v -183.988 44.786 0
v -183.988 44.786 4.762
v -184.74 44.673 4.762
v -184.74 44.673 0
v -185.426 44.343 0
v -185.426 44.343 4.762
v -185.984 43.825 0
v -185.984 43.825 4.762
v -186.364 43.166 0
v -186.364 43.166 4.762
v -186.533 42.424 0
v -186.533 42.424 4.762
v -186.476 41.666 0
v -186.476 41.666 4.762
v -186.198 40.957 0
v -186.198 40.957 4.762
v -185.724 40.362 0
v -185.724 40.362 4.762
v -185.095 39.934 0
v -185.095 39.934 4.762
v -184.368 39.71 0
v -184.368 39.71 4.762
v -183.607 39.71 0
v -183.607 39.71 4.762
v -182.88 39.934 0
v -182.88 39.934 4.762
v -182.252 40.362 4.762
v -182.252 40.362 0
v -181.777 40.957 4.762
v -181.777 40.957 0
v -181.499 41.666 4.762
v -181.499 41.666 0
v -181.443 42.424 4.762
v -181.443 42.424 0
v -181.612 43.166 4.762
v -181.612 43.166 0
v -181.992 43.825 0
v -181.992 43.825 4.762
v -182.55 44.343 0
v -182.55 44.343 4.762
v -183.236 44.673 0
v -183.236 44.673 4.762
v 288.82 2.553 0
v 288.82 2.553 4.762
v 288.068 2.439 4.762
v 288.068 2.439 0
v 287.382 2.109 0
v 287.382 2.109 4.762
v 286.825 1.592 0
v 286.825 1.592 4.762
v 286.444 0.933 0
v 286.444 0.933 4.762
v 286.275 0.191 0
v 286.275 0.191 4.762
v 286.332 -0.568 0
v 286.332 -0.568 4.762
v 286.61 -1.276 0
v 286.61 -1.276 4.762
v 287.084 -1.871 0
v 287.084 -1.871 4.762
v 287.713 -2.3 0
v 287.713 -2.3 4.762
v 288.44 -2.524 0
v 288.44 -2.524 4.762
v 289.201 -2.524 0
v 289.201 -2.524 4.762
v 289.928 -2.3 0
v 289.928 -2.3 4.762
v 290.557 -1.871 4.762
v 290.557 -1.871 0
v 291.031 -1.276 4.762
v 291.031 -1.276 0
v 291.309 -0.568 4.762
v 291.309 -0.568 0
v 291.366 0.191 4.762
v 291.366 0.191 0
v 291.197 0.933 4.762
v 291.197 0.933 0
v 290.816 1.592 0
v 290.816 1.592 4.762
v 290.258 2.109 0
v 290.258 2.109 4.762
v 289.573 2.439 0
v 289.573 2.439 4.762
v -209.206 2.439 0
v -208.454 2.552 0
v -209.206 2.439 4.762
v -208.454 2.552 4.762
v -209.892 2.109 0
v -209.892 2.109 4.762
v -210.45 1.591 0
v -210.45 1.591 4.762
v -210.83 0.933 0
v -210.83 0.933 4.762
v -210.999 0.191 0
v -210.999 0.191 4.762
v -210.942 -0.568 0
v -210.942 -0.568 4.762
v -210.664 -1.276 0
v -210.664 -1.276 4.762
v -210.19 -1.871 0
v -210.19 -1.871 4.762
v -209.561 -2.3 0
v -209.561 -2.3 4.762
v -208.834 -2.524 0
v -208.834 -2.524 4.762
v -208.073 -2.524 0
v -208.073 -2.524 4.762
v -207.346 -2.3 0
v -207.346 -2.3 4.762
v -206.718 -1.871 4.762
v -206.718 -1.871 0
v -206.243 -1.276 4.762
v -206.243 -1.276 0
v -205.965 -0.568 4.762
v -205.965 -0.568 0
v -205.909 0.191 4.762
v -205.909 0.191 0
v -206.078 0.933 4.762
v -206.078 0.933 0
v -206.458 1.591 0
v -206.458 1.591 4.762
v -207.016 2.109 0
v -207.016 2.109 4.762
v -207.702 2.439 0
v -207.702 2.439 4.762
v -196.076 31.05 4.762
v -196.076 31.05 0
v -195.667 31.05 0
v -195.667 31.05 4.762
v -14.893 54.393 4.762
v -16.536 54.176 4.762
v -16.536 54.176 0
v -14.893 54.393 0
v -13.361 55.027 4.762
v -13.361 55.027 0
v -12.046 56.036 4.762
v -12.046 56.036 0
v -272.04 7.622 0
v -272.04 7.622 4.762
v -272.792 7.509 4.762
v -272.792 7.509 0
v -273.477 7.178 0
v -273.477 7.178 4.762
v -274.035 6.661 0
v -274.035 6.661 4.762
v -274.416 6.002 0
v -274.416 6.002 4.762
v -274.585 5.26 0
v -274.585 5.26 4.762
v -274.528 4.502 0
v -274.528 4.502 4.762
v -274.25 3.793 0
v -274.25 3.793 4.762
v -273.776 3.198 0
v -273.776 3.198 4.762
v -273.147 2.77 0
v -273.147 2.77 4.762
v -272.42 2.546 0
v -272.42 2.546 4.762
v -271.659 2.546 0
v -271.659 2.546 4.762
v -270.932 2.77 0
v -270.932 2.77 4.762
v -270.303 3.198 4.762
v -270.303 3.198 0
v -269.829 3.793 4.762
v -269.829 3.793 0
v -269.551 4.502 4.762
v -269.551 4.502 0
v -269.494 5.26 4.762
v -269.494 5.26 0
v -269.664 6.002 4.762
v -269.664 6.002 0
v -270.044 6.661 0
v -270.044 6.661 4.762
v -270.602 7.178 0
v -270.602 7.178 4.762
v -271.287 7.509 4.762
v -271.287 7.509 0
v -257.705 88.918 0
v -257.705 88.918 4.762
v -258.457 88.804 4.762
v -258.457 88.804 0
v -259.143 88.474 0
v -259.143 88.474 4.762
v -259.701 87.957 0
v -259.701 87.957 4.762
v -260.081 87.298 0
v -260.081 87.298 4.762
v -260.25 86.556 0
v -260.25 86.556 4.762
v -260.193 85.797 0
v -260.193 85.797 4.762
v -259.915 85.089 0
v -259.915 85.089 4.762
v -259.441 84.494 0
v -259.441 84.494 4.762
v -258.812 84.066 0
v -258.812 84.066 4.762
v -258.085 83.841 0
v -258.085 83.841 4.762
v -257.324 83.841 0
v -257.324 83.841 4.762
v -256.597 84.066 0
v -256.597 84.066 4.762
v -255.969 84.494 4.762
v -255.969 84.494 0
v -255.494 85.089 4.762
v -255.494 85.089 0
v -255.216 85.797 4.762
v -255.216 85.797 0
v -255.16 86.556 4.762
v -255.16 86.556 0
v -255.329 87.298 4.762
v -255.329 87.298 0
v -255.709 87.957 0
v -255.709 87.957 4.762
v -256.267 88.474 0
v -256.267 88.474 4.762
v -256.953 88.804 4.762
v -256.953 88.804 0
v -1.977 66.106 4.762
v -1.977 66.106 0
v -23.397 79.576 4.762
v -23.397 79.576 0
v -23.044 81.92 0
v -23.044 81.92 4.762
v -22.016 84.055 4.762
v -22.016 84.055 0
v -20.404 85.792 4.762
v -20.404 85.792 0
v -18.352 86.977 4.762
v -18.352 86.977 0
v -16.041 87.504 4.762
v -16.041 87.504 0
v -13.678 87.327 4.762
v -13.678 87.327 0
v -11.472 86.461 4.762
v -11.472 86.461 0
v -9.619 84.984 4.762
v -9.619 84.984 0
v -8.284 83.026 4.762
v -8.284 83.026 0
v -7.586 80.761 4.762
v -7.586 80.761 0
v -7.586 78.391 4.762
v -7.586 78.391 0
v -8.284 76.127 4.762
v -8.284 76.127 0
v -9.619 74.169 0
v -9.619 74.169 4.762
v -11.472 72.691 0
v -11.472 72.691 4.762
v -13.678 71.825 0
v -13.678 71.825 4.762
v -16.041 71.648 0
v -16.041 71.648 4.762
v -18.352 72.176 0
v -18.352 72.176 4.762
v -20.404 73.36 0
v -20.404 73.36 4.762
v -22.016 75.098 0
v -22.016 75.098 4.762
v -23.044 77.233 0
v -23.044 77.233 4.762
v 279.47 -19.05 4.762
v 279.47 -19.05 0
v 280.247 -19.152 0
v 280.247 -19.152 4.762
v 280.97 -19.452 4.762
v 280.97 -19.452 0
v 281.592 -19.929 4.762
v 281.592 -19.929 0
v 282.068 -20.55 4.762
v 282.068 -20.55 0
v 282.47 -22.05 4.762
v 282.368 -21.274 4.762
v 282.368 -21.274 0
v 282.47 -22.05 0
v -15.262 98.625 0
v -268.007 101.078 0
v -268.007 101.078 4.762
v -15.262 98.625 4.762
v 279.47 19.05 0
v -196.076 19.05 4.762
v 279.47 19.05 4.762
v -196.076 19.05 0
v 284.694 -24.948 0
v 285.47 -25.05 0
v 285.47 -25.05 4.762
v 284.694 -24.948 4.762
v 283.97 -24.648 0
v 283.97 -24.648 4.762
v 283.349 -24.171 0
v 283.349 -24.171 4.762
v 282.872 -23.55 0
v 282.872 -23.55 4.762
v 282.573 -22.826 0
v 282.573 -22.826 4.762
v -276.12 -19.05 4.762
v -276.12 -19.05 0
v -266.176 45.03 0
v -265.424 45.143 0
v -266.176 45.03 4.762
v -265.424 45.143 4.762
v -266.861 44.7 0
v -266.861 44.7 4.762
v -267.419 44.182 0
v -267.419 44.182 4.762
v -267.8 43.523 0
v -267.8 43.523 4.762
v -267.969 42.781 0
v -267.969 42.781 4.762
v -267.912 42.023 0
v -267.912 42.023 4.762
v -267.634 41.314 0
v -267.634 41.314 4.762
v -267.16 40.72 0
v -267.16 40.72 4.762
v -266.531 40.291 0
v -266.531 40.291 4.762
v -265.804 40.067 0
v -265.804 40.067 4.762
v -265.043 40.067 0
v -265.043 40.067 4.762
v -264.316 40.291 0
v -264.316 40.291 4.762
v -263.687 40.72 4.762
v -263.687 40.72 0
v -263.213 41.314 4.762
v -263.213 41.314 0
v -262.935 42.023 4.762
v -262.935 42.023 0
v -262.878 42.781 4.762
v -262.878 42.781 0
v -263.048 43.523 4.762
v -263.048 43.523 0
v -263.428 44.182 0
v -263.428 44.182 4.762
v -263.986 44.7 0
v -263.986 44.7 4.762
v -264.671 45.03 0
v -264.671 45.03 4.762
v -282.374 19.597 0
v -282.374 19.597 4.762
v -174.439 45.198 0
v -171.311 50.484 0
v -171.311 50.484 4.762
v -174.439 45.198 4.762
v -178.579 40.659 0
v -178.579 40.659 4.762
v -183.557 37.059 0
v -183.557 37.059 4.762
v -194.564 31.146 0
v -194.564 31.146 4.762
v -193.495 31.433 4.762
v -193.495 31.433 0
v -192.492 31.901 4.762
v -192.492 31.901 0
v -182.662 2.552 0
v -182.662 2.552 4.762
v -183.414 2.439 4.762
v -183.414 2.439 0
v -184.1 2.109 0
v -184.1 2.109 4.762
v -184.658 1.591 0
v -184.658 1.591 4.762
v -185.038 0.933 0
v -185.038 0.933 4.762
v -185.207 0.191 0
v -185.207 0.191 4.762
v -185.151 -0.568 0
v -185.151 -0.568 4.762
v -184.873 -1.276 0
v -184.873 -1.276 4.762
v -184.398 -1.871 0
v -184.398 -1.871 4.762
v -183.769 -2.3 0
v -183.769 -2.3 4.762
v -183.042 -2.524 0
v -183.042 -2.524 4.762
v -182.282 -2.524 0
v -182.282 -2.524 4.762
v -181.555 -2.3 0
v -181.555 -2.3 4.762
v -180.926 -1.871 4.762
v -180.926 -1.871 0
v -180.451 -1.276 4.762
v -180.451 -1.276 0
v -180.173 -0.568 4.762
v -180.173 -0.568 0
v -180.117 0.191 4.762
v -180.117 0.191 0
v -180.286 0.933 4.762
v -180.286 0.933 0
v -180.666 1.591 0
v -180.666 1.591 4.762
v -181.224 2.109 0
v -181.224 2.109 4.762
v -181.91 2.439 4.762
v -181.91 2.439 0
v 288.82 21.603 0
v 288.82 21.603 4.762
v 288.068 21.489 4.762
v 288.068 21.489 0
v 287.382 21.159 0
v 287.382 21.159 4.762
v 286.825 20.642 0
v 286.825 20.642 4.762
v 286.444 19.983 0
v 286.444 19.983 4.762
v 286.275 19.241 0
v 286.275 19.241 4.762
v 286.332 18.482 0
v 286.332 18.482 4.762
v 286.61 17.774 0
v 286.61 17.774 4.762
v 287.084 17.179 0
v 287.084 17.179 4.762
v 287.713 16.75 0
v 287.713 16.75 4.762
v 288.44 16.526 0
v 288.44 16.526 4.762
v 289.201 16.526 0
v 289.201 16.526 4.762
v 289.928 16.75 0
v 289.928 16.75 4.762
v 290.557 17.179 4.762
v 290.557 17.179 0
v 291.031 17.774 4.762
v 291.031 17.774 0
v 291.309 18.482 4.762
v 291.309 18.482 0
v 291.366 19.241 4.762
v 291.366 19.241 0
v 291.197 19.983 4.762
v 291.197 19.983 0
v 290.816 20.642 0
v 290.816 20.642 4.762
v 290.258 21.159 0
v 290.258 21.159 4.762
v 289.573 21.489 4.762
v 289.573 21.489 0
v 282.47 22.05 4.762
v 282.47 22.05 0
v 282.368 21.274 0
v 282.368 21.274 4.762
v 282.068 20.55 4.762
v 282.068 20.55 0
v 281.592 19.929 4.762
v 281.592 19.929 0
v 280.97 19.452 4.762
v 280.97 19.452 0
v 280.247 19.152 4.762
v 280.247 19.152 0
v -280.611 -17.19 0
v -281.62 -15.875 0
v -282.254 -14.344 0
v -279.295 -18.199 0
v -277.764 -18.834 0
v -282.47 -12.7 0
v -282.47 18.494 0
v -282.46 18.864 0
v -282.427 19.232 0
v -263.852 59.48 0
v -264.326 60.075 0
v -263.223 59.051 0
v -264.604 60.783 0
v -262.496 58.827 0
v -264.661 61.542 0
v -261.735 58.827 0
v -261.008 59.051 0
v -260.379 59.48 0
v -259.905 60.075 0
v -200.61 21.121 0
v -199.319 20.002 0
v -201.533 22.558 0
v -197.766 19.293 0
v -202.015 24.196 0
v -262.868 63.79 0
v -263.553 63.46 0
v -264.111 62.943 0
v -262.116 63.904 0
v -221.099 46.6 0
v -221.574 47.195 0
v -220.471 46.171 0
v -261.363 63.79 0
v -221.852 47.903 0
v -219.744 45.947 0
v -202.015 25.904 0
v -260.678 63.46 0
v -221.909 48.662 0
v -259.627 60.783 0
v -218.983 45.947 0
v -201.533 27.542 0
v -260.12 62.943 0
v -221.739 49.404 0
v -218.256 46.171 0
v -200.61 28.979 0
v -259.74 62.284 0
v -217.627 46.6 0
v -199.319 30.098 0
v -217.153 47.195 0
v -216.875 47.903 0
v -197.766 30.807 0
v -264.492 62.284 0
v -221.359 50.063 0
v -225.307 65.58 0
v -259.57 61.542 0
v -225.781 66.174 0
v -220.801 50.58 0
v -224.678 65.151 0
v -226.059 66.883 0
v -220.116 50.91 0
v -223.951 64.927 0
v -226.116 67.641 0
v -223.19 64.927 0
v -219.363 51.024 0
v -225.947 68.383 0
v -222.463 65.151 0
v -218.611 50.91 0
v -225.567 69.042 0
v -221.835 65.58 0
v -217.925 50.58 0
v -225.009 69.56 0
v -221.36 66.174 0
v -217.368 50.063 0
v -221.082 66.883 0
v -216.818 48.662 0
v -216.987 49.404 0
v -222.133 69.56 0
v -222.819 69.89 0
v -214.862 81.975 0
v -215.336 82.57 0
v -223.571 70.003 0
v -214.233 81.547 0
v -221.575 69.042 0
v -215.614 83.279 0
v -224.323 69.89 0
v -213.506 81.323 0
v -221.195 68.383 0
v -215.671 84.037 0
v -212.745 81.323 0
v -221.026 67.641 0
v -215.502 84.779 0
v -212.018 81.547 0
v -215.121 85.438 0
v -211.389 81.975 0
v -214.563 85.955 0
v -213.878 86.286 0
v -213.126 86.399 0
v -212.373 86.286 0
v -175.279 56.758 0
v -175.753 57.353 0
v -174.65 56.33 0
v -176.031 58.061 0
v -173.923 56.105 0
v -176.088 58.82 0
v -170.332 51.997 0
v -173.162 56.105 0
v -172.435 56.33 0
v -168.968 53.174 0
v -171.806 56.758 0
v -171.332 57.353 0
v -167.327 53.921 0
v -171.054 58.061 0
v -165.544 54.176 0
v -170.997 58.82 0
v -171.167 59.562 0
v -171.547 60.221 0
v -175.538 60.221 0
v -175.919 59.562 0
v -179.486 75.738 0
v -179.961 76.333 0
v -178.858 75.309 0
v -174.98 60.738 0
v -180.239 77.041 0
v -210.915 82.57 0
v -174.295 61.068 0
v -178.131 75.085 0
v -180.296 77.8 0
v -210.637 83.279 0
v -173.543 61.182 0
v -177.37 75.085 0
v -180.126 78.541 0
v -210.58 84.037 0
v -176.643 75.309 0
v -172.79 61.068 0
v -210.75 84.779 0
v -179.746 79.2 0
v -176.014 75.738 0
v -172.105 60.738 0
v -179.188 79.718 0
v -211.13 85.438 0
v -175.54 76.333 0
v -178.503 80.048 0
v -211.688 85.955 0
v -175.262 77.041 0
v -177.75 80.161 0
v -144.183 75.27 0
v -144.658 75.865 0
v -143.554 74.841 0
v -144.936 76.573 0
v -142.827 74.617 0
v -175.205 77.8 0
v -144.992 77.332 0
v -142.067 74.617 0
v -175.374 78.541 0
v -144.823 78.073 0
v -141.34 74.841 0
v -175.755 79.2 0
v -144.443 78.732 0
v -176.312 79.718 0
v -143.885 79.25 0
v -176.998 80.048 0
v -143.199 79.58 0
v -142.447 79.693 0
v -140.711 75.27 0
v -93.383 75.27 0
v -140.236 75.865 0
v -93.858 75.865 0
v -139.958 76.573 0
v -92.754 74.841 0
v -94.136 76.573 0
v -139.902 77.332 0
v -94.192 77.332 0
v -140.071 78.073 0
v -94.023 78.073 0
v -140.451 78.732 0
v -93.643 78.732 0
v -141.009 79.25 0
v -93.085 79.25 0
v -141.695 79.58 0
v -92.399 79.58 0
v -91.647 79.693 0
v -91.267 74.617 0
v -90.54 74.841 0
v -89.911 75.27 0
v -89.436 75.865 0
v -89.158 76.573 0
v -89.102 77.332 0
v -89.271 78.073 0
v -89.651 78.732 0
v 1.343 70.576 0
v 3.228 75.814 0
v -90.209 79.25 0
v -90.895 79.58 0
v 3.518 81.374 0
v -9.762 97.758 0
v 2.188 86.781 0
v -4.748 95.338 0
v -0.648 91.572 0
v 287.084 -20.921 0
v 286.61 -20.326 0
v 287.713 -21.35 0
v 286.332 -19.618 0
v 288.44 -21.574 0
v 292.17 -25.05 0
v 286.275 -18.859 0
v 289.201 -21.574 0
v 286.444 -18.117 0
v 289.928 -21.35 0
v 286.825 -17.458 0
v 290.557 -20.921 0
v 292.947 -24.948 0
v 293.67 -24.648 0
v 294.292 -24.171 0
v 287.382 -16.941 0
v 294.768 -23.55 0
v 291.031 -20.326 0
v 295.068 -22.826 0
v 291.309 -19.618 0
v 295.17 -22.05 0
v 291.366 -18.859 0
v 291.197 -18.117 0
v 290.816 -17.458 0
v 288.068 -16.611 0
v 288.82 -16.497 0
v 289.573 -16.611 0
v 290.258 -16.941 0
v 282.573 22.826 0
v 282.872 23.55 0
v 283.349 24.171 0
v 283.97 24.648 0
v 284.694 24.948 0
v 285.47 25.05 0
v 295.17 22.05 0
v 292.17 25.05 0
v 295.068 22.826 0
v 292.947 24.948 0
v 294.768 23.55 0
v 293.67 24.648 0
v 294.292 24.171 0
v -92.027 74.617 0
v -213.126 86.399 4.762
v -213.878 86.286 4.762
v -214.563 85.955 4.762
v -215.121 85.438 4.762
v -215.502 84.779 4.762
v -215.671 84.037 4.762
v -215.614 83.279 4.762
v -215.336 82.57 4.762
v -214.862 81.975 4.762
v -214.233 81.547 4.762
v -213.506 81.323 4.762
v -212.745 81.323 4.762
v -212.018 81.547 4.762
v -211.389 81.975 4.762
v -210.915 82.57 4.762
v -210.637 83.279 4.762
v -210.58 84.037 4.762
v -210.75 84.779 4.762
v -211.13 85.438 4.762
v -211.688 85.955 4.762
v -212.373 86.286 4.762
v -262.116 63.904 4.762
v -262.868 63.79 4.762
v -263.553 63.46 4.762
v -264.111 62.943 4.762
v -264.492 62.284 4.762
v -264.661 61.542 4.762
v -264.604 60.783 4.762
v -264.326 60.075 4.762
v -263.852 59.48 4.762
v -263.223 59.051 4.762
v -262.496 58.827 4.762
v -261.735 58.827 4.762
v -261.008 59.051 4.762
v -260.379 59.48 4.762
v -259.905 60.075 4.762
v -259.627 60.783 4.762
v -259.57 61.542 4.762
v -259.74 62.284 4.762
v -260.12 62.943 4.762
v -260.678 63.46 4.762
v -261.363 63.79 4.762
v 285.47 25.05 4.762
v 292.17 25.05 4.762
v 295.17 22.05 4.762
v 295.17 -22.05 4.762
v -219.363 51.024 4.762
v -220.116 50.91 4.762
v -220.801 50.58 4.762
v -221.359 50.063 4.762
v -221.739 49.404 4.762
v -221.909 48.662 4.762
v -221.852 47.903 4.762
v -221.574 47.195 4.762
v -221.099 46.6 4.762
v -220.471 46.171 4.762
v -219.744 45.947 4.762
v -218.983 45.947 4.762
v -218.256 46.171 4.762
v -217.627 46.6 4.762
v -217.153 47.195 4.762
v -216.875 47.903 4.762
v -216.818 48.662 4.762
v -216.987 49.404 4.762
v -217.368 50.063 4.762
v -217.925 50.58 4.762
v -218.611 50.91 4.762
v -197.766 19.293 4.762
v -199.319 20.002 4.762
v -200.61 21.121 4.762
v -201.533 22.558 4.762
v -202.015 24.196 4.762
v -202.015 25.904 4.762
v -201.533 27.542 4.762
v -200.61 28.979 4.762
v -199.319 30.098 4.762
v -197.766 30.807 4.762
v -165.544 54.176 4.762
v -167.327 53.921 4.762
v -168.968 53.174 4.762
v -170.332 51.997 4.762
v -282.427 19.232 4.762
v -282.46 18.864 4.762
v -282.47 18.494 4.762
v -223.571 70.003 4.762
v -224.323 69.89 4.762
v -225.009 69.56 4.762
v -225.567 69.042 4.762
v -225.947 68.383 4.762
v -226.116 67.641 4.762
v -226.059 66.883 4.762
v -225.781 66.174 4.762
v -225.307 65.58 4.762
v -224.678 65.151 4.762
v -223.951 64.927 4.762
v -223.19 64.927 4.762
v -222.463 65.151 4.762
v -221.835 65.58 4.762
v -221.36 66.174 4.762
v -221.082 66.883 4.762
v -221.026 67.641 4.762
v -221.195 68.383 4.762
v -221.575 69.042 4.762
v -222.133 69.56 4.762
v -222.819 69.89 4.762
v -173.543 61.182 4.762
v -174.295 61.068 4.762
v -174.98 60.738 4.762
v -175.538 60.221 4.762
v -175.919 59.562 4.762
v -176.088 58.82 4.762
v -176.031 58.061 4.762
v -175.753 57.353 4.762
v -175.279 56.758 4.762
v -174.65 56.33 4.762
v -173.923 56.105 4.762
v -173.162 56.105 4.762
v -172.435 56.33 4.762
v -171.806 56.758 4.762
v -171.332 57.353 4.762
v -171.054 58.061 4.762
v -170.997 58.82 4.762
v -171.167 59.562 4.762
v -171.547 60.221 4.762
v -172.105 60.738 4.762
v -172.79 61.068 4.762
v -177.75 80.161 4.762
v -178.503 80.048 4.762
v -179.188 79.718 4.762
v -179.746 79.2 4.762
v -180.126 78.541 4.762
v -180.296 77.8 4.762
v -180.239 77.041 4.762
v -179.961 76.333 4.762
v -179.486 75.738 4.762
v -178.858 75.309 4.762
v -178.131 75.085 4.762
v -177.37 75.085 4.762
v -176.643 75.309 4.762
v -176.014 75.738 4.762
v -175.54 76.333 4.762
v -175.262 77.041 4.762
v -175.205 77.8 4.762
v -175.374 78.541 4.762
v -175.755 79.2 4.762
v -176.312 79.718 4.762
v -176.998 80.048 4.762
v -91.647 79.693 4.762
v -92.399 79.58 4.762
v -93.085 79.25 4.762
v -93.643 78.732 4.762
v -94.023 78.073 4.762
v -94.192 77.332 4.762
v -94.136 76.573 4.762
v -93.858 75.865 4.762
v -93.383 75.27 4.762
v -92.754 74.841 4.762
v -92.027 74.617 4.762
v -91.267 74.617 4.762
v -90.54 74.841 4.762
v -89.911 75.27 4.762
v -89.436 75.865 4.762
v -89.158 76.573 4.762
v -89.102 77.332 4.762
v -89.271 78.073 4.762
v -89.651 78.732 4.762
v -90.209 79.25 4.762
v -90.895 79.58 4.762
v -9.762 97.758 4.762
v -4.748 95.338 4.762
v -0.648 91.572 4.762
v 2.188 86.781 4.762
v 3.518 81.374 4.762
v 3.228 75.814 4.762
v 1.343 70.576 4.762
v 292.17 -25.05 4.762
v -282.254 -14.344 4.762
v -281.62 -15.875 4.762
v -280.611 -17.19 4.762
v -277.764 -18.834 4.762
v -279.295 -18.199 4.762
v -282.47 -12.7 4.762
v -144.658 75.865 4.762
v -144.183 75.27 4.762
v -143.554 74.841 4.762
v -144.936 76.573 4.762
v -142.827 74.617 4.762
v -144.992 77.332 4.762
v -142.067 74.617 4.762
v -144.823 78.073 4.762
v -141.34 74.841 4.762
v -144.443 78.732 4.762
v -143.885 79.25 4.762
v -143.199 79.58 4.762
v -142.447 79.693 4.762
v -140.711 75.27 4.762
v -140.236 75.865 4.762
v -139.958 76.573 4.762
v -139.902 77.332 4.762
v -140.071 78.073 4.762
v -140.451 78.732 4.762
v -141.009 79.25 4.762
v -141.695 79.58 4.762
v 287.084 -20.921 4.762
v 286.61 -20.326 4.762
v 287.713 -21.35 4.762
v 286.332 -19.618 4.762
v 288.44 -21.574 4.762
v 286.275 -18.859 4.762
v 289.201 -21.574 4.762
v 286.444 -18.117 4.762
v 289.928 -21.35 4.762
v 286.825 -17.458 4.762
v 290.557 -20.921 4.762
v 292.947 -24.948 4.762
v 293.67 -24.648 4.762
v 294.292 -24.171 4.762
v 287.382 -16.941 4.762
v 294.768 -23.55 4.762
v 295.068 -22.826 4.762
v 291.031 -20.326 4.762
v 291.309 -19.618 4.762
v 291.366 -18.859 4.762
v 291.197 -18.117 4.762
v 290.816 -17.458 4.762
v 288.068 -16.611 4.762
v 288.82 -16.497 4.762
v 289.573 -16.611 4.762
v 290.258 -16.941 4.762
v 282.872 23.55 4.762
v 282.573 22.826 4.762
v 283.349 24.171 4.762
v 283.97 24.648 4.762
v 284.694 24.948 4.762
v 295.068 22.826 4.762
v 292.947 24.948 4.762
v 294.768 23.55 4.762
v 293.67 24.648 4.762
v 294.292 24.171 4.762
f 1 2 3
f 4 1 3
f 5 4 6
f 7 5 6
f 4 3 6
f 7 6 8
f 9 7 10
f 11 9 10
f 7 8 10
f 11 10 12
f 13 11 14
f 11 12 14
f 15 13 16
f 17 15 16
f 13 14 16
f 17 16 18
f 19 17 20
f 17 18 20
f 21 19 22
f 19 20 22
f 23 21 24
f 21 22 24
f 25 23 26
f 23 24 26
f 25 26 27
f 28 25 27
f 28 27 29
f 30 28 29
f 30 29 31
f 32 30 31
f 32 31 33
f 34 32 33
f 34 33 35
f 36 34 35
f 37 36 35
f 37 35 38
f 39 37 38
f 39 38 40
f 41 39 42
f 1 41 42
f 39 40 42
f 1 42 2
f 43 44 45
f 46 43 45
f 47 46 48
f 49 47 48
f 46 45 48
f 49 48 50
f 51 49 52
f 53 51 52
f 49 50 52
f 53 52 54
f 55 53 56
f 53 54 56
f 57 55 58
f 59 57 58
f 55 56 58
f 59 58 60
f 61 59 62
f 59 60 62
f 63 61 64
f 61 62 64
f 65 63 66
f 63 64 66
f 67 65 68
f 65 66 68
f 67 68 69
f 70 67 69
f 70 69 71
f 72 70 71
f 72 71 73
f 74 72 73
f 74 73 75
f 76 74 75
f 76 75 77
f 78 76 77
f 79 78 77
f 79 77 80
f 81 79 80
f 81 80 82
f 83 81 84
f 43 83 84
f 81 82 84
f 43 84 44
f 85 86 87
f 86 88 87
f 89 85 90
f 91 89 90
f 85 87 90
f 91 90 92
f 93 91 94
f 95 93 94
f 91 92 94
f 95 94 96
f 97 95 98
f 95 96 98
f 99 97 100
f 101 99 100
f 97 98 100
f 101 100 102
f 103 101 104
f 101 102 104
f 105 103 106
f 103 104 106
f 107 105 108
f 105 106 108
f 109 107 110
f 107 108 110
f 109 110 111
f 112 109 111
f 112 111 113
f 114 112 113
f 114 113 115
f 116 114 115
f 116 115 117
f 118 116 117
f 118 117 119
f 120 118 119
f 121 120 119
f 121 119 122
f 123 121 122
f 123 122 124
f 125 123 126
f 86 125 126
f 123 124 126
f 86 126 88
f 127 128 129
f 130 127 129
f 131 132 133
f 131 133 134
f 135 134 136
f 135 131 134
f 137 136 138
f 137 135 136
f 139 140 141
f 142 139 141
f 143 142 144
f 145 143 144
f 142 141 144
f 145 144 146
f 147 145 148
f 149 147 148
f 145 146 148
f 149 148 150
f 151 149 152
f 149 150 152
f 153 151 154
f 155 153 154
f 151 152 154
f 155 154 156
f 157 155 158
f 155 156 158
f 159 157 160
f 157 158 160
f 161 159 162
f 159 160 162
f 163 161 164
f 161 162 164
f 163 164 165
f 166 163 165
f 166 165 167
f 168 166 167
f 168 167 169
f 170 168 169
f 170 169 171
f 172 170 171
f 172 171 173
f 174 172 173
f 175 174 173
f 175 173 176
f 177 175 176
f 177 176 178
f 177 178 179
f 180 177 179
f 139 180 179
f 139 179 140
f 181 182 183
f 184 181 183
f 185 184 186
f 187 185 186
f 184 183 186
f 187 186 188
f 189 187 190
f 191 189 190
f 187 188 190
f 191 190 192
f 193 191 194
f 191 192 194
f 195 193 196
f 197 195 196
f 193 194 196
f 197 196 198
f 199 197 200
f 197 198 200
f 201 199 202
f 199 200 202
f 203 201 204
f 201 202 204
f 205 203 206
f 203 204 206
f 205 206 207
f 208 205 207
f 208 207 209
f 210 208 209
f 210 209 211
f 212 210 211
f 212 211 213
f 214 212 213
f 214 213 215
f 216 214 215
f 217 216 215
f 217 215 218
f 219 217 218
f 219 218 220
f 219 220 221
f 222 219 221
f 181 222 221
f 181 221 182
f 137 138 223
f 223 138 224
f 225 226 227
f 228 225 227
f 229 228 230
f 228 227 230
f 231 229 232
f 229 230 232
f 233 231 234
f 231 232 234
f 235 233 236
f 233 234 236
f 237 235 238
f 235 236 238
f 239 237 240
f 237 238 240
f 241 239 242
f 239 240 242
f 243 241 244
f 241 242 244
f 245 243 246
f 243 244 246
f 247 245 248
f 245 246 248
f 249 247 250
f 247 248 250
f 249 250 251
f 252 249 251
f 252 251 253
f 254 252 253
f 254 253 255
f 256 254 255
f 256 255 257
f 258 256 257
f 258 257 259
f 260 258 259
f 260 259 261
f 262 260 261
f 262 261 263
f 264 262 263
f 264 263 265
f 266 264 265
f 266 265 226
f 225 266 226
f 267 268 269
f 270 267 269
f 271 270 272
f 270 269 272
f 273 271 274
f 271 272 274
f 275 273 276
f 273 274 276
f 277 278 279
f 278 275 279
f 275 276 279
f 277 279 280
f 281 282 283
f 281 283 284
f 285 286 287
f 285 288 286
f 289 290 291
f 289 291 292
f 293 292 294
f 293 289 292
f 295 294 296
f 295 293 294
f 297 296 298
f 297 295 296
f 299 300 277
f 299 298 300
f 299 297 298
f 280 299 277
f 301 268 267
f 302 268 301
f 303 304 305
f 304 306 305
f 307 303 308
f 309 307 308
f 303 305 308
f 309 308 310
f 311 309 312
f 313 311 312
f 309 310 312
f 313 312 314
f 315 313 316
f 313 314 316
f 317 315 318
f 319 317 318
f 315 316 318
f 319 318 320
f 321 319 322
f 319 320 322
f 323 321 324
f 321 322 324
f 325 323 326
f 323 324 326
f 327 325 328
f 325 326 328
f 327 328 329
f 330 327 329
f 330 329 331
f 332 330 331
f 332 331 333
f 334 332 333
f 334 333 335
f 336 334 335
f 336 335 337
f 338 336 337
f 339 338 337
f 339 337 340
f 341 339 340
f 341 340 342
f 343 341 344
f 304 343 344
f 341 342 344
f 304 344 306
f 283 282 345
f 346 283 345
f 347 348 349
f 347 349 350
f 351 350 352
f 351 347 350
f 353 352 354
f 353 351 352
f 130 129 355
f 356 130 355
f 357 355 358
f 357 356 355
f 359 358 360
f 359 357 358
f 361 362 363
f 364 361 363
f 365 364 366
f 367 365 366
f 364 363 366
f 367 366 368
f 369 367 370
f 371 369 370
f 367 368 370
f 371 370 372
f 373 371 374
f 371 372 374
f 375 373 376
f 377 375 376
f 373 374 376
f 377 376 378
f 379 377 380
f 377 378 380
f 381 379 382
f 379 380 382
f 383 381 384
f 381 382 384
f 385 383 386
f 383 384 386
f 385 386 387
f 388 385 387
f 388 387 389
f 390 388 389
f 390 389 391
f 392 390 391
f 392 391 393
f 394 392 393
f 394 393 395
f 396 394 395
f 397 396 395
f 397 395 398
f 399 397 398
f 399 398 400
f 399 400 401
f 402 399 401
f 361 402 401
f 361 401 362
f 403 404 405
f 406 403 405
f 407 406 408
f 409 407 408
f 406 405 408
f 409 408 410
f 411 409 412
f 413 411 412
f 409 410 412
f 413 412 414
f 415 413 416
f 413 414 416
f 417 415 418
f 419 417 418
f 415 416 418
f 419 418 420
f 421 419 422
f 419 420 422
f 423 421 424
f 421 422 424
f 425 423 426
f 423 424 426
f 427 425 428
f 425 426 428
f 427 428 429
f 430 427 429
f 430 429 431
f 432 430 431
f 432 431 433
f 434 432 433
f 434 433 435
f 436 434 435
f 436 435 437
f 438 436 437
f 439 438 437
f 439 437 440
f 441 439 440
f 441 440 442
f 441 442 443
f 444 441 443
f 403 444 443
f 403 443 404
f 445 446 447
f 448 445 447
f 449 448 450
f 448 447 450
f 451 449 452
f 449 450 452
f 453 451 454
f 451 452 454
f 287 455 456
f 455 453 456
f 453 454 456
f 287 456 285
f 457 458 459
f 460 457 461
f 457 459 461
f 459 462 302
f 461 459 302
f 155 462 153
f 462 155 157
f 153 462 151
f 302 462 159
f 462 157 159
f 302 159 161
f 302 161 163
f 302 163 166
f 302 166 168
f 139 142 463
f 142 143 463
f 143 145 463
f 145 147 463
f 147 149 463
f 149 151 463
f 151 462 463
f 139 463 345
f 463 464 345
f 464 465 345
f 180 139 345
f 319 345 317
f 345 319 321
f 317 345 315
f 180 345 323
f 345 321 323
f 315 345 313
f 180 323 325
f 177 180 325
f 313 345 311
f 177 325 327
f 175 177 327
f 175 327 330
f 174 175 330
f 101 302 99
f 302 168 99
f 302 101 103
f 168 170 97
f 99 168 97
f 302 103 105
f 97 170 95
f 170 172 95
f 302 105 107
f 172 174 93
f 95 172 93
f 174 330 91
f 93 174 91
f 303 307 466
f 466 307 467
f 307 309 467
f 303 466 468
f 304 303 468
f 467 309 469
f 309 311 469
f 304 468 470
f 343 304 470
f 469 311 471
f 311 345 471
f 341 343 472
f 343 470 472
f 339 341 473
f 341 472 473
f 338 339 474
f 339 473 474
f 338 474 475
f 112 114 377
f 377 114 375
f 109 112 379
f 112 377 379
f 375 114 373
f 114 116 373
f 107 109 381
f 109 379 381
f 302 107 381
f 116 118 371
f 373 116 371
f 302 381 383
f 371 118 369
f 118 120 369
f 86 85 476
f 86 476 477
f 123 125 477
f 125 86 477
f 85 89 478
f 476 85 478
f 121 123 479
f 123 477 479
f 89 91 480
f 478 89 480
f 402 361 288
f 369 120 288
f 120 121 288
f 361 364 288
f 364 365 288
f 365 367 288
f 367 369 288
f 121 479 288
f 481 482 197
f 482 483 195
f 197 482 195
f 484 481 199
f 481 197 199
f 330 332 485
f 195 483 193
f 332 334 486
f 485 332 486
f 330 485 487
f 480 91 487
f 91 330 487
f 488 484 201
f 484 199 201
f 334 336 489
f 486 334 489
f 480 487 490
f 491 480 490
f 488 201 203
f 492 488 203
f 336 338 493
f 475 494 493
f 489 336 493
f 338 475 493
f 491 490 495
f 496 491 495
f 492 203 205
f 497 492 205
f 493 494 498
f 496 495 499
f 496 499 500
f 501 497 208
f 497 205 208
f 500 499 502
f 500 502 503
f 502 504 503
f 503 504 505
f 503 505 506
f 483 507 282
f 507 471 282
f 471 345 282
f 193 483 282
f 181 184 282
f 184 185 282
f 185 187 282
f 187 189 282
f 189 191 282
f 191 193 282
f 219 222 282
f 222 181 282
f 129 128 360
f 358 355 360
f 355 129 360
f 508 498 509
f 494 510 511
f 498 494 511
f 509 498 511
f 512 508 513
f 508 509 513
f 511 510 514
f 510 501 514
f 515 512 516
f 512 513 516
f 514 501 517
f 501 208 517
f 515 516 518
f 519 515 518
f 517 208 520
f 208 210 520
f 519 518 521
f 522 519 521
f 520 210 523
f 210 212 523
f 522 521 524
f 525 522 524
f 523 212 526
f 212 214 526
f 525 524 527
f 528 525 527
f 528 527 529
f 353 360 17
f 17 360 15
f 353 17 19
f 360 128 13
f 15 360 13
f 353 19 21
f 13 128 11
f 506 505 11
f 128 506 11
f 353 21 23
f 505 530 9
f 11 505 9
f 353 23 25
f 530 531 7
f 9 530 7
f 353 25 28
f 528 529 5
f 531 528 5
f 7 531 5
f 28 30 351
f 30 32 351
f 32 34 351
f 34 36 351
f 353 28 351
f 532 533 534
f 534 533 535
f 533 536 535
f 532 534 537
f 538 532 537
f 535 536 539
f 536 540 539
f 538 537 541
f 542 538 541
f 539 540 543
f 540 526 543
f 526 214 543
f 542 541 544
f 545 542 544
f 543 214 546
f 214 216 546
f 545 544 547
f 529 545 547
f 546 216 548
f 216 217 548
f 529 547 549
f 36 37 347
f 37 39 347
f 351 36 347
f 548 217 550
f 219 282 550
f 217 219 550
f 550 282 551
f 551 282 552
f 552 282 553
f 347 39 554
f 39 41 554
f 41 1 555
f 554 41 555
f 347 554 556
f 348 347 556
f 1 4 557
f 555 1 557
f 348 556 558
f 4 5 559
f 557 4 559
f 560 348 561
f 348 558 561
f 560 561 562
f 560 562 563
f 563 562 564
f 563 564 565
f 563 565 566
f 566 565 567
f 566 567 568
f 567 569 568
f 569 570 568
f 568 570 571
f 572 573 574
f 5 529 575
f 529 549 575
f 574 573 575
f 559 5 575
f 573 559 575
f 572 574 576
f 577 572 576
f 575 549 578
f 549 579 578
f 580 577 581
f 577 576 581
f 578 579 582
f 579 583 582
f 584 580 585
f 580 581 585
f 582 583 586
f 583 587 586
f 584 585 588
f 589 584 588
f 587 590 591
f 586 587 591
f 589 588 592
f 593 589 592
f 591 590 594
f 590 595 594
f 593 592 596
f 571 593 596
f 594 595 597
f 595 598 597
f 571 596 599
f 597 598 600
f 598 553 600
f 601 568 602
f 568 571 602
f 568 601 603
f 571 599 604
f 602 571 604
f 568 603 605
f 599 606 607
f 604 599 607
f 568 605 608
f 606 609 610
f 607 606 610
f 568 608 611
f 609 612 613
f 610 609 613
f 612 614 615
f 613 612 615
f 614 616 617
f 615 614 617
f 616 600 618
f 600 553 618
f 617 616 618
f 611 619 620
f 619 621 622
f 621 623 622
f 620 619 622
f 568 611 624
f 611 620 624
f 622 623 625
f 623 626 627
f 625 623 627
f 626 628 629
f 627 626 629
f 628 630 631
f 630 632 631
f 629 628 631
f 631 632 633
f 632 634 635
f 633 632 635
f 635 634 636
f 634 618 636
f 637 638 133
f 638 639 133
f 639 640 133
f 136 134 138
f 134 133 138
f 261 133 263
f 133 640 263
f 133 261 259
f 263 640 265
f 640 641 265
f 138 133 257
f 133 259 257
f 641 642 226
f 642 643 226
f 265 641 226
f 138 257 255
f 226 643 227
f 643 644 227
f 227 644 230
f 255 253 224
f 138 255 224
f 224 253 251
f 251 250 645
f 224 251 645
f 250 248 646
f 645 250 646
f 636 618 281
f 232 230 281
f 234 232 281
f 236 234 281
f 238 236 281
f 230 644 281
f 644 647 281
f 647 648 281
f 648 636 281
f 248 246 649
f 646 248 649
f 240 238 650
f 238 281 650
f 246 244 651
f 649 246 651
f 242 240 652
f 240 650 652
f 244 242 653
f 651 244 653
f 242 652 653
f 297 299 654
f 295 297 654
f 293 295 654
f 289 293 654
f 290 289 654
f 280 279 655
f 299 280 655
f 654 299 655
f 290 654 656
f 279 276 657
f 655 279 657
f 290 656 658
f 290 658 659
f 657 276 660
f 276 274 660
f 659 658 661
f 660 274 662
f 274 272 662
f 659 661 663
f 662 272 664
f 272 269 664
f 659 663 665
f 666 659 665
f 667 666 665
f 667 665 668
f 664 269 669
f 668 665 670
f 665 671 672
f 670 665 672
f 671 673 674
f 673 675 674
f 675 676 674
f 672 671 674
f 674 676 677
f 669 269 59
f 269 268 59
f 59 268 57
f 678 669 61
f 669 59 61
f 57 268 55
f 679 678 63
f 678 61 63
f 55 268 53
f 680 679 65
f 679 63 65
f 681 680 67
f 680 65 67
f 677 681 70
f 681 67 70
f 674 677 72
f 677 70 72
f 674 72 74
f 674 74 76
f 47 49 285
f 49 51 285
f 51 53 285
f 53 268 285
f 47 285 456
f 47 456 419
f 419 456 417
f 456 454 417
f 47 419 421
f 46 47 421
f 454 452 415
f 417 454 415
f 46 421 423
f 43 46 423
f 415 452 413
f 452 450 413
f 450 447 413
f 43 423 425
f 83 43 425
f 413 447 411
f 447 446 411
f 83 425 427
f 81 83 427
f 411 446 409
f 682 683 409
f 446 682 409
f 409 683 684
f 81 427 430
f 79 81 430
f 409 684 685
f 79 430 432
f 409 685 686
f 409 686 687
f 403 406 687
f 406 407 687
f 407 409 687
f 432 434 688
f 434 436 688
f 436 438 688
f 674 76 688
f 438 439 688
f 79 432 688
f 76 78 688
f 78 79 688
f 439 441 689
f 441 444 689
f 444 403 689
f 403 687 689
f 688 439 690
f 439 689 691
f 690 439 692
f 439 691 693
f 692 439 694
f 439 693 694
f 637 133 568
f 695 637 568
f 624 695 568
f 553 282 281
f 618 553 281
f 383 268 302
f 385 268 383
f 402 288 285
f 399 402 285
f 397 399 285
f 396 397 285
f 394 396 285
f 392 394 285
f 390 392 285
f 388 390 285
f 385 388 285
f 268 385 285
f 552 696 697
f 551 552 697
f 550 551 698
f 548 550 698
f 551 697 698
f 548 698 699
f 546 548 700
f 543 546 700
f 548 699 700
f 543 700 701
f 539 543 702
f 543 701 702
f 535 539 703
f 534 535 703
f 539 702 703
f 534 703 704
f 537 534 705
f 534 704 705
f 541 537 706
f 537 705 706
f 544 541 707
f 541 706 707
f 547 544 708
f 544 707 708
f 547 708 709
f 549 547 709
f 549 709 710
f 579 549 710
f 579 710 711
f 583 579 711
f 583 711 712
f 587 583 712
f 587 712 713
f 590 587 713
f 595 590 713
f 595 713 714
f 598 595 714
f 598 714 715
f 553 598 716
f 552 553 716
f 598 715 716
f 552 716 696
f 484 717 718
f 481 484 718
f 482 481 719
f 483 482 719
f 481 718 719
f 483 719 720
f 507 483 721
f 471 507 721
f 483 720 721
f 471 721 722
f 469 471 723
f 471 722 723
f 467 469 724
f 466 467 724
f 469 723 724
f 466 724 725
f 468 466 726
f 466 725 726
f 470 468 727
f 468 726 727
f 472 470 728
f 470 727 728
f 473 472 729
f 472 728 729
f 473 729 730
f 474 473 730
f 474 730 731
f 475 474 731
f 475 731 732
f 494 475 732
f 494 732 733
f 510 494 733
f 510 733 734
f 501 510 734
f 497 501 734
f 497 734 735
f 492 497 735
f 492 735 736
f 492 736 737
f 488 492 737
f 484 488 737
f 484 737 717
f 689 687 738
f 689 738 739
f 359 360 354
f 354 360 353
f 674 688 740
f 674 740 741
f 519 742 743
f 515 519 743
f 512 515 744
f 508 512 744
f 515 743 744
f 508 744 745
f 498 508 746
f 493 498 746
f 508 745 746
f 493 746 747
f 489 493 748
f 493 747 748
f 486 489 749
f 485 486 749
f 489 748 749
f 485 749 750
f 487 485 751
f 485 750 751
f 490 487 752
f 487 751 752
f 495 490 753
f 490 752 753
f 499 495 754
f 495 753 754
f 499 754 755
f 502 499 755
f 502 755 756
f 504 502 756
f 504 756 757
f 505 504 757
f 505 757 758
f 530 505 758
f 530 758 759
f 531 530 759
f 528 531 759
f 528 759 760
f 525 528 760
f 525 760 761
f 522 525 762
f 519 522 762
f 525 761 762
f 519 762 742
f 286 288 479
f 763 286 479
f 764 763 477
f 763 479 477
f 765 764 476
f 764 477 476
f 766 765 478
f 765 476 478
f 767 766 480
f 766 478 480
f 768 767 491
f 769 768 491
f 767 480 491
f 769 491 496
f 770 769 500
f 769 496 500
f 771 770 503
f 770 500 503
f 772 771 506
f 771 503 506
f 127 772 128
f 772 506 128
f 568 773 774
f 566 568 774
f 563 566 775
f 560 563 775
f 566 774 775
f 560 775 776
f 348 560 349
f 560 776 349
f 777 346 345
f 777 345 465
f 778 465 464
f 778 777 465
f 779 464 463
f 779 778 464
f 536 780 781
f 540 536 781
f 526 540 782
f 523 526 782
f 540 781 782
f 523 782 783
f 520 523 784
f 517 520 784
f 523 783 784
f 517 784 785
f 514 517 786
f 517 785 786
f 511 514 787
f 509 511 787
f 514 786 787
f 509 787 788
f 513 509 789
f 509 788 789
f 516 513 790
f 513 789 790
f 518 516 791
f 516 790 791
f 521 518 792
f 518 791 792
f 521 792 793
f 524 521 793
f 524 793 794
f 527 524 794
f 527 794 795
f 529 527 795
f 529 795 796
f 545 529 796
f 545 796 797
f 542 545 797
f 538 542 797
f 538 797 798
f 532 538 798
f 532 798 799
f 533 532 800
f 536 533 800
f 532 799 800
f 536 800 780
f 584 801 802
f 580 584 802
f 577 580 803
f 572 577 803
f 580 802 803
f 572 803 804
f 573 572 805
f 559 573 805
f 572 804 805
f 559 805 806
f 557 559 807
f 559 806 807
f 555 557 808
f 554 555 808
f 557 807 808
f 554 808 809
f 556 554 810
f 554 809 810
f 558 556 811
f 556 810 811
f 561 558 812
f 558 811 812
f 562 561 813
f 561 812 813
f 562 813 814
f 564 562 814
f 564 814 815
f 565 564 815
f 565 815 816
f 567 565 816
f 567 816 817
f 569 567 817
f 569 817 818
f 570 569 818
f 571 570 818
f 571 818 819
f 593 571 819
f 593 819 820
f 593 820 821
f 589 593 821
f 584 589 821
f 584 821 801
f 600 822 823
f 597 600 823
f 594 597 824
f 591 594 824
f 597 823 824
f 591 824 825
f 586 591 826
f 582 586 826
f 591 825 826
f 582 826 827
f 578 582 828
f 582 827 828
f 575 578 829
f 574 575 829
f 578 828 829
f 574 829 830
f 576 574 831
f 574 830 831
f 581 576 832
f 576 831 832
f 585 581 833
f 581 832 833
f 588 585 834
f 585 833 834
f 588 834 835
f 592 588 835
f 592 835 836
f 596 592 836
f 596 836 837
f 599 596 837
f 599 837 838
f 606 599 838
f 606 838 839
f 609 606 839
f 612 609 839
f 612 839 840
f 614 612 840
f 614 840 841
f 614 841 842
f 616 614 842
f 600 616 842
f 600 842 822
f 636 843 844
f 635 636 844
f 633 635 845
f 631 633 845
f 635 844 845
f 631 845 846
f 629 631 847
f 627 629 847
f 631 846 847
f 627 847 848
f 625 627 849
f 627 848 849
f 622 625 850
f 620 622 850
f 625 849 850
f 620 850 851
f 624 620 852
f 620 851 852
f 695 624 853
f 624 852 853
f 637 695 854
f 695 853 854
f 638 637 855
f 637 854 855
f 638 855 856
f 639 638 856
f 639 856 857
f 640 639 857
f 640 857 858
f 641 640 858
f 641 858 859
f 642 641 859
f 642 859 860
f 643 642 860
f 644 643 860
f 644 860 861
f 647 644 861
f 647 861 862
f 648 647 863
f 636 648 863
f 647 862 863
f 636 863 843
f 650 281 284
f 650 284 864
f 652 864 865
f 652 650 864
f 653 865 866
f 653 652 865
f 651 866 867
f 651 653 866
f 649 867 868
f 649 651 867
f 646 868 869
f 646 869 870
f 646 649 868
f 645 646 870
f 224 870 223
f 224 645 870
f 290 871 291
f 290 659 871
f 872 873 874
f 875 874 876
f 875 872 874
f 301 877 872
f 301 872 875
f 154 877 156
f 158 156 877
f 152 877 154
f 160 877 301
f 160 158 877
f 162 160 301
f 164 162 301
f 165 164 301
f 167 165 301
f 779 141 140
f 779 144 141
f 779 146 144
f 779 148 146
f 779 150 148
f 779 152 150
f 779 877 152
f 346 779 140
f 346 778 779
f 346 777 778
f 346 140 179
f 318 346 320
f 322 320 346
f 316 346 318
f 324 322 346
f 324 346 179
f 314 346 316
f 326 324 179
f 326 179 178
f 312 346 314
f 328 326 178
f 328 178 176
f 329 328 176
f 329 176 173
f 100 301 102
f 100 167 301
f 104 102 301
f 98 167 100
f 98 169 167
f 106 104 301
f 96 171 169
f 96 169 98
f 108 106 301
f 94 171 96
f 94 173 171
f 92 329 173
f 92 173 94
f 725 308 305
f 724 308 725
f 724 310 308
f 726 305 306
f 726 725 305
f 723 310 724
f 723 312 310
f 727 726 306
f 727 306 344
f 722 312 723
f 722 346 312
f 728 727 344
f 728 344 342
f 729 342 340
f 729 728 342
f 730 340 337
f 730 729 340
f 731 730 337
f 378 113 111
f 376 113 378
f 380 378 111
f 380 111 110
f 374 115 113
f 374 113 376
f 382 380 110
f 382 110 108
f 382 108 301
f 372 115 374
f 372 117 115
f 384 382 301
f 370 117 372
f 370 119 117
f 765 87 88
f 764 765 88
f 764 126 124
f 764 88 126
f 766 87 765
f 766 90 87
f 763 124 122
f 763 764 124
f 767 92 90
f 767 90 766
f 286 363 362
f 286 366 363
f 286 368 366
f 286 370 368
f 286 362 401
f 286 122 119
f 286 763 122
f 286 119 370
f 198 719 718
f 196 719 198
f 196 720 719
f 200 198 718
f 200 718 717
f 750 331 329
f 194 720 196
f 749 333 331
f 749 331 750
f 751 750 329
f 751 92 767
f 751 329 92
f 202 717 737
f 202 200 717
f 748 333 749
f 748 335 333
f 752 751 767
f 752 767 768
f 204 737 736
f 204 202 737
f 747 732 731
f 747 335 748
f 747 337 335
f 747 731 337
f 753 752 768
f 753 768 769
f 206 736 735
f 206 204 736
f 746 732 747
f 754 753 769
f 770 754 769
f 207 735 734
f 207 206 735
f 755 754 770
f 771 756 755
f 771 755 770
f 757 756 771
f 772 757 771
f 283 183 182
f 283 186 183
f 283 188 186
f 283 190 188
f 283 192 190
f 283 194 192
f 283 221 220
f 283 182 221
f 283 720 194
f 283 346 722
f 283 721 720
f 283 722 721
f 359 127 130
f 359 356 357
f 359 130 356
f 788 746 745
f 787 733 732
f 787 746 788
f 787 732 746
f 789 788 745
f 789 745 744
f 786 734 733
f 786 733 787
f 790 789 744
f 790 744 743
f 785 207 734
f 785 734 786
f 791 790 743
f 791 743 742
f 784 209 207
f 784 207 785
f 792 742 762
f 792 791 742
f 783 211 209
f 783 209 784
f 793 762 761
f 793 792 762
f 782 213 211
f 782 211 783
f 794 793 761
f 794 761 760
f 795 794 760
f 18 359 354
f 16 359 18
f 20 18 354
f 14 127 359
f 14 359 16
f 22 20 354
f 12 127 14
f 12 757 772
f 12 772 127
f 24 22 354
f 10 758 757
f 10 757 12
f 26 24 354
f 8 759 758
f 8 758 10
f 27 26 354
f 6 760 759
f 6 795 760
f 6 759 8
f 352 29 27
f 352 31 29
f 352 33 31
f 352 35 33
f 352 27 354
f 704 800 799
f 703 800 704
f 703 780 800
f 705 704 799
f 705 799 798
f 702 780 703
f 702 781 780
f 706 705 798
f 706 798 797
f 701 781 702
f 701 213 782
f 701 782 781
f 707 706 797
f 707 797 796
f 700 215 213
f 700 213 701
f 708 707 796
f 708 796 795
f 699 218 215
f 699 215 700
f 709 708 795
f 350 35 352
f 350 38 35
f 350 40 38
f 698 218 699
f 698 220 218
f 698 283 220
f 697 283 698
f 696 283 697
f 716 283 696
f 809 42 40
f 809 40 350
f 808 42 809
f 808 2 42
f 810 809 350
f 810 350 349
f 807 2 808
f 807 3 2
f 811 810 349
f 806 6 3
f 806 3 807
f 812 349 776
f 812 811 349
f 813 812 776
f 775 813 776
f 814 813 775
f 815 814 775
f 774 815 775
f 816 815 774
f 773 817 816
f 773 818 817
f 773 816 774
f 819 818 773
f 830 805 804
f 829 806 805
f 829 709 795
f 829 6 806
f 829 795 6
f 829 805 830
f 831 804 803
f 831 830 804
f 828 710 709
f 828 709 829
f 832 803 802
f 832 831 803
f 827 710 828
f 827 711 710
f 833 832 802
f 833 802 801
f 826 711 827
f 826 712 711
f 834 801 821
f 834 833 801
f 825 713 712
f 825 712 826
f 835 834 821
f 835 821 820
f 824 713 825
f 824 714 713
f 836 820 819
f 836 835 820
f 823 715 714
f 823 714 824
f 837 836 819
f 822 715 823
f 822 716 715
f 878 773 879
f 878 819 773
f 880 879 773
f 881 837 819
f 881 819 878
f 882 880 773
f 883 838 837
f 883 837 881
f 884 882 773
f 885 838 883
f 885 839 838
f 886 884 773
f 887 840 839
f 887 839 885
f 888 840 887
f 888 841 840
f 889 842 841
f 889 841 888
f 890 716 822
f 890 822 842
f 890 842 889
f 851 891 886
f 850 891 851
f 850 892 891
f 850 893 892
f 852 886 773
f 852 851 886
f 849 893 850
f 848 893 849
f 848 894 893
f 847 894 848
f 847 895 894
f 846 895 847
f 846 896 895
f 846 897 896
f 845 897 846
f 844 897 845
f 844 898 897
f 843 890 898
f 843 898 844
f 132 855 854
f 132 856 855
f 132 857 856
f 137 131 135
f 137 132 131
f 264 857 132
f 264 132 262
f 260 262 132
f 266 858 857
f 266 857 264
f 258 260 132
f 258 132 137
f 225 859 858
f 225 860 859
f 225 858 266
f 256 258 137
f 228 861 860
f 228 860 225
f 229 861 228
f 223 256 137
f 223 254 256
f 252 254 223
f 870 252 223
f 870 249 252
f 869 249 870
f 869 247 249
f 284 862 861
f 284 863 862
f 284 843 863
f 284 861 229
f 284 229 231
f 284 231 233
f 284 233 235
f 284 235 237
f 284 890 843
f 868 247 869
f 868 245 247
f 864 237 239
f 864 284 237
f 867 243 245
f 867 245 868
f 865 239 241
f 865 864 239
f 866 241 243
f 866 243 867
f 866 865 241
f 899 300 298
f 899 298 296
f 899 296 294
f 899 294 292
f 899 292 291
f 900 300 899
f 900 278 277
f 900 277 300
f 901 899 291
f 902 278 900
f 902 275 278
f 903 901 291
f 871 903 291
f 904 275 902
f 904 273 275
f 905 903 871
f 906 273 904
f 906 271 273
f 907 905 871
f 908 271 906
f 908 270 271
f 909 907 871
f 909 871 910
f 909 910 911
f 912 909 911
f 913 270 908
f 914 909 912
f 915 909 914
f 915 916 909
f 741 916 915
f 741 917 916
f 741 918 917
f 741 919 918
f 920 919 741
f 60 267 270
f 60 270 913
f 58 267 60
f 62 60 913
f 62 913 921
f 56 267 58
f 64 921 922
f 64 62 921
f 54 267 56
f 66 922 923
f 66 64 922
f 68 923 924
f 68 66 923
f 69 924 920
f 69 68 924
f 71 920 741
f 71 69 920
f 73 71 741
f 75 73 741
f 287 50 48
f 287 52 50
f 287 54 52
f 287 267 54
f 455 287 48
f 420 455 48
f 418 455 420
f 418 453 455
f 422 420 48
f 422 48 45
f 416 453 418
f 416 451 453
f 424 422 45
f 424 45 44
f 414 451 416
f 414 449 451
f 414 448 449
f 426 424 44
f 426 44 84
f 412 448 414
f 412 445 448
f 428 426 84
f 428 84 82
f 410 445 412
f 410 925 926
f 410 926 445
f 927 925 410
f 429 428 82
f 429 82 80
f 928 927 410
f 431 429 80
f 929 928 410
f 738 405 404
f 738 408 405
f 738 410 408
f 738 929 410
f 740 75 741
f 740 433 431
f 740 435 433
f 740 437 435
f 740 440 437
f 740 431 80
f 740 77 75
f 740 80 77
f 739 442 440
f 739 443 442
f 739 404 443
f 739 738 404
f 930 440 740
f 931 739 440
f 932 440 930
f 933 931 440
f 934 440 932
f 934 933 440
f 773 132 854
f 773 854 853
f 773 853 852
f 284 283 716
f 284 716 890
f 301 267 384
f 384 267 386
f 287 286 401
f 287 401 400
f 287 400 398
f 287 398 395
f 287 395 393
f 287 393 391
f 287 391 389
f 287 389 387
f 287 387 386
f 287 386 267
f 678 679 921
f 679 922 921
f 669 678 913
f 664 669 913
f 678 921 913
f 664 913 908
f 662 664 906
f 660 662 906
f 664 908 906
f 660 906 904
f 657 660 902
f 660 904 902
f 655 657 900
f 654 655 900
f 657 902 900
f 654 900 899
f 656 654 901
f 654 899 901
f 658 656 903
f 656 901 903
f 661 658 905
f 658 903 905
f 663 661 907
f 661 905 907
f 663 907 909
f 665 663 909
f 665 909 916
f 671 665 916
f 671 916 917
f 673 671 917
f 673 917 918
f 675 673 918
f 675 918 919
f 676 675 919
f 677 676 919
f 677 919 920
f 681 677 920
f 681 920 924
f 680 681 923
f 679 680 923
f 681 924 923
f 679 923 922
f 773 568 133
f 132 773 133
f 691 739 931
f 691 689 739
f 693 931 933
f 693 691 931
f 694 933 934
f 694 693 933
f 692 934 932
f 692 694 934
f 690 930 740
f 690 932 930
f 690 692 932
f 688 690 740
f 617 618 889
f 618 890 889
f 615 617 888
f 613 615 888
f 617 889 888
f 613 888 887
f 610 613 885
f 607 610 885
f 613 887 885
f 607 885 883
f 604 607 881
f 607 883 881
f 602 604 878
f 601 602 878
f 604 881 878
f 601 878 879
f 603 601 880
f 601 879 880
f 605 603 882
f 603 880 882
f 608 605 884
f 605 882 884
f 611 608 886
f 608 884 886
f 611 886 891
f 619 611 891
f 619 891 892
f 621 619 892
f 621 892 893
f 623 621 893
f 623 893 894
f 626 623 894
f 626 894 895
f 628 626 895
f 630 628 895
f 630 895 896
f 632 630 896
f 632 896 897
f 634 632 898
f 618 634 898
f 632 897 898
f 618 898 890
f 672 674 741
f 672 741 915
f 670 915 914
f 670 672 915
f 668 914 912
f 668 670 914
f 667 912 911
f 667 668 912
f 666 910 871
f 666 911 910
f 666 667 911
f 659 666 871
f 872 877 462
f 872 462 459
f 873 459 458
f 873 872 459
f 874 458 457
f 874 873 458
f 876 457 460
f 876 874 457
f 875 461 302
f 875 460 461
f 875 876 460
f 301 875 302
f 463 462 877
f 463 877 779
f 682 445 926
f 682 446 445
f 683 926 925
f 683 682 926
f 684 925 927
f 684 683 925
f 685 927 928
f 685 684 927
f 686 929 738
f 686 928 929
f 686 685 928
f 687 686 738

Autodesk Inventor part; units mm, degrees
ref_plane "YZ Plane" through (0, 0, 0) normal (1, 0, 0) x (0, 1, 0)
ref_plane "XZ Plane" through (0, 0, 0) normal (0, 1, 0) x (-1, 0, 0)
ref_plane "XY Plane" through (0, 0, 0) normal (0, 0, 1) x (1, 0, 0)
sketch "Sketch1" plane through (0, 0, 0) normal (0, 0, 1) x (1, 0, 0)
  line L0 (279.4704, -19.05) -> (-282.4704, -19.05)
  line L1 (-282.4704, -19.05) -> (-282.4704, 19.05)
  line L2 (-282.4704, 19.05) -> (279.4704, 19.05)
  line L3 (282.4704, -19.05) -> (-282.4704, 19.05) construction
  line L4 (-282.4704, -19.05) -> (282.4704, 19.05) construction
  line L5 (292.1704, -25.05) -> (285.4704, -25.05)
  line L6 (285.4704, 25.05) -> (292.1704, 25.05)
  line L7 (295.1704, 22.05) -> (295.1704, -22.05)
  line L8 (295.1704, -25.05) -> (282.4704, 25.05) construction
  line L9 (282.4704, -25.05) -> (295.1704, 25.05) construction
  line L10 (282.4704, -22.05) -> (282.4704, -22.05)
  line L11 (282.4704, 22.05) -> (282.4704, 22.05)
  arc A0 (279.4704, 19.05) -> (282.4704, 22.05) centre (279.4704, 22.05) ccw
  arc A1 (285.4704, 25.05) -> (282.4704, 22.05) centre (285.4704, 22.05) ccw
  arc A2 (295.1704, 22.05) -> (292.1704, 25.05) centre (292.1704, 22.05) ccw
  arc A3 (292.1704, -25.05) -> (295.1704, -22.05) centre (292.1704, -22.05) ccw
  arc A4 (282.4704, -22.05) -> (285.4704, -25.05) centre (285.4704, -22.05) ccw
  arc A5 (282.4704, -22.05) -> (279.4704, -19.05) centre (279.4704, -22.05) ccw
  point P0 (0, 0)
  point P1 (288.8204, 0)
  point P2 (282.4704, 0)
  point P3 (295.1704, 0)
  dimension "d0" = 12.7
  dimension "d1" = 577.6407
  dimension "d2" = 6
  dimension "d3" = 38.1
  dimension "d4" = 3
extrude "Plate1" add sketch "Sketch1" along normal blind 4.7625
sketch "Sketch2" plane through (0, 0, 0) normal (0, 0, -1) x (-1, 0, 0)
  line L0 (-288.8204, -19.05) -> (-288.8204, 19.05)
  line L1 (-295.1704, -22.05) -> (-295.1704, 22.05) projected
  line L2 (-288.8204, 0) -> (-295.1704, 0)
  point P0 (0, 0)
  dimension "d6" = 6.35
  dimension "d7" = 38.1
hole "Hole1" at (288.8204, -19.05, 0) at (288.8204, 0, 0) at (288.8204, 19.05, 0) direction (0, 0, 1) diameter 5.1054 depth 4.7625 tip angle 118 clearance for "Flat Head Machine Screw (82)" size "#10" standard "Ansi Unified Screw Threads"
sketch "Sketch3" plane through (0, 0, 0) normal (0, 0, -1) x (-1, 0, 0)
  line L0 (268.0066, 101.0778) -> (282.4704, 19.05)
  line L1 (180.2314, 85.6006) -> (268.0066, 101.0778)
  arc A0 (180.2314, 85.6006) -> (176.9524, 83.8547) centre (181.2732, 79.6918) ccw
  arc A1 (176.9524, 83.8547) -> (183.5568, 37.0593) centre (198.5568, 63.04) ccw
  line L2 (-279.4704, 19.05) -> (282.4704, 19.05)
  line L3 (282.4704, 19.05) -> (214.7497, 19.05)
  line L4 (282.4704, 19.05) -> (282.4704, -19.05)
  arc A2 (196.0756, 19.05) -> (196.0756, 31.05) centre (196.0756, 25.05) ccw
  line L5 (196.0756, 31.05) -> (193.9651, 31.05)
  line L6 (193.9651, 31.05) -> (183.5568, 37.0593)
  arc A3 (169.2665, 76.5071) -> (165.9875, 74.7612) centre (170.3084, 70.5983) ccw
  line L7 (169.8961, 54.1762) -> (13.9062, 54.1762)
  arc A4 (15.2621, 98.6253) -> (1.9766, 66.1058) centre (15.447, 79.5762) ccw
  line L8 (268.0066, 101.0778) -> (15.2621, 98.6253)
  line L9 (13.9062, 54.1762) -> (1.9766, 66.1058)
  circle A5 centre (15.447, 79.5762) radius 7.9502
  line L10 (282.4704, 19.05) -> (-279.4704, 19.05)
  point P0 (0, 0)
  point P1 (187.5919, 53.9466)
  dimension "d16" = 43.99
  dimension "d17" = 80
  dimension "d18" = 83.9136
  dimension "d19" = 30
  dimension "d20" = 6
  dimension "d21" = 83.2932
  dimension "d28" = 12
  dimension "d29" = 86.3948
  dimension "d30" = 30
  dimension "d44" = 6
  dimension "d45" = 25.4
  dimension "d46" = 38.1
  dimension "d47" = 135
  dimension "d48" = 15.9004
  dimension "d49" = 35.1262
  dimension "d50" = 252.4564
sheet face with bend "Face2" sketch "Sketch3" thickness 4.7625 toward (0, 0, 1) bend radius 4.7625
bend "Bend1"
fillet "Corner Round1" radius 6.35 5 edges at (-282.4704, 19.05, 2.3813) (-282.4704, -19.05, 2.3813) (-193.9651, 31.05, 2.3813) (-13.9062, 54.1762, 2.3813) (-169.8961, 54.1762, 2.3813)
sketch "Sketch4" plane through (0, 0, 0) normal (0, 0, -1) x (-1, 0, 0)
  line L0 (282.3739, 19.5971) -> (268.0066, 101.0778) projected
  arc A0 (169.8961, 54.1762) -> (183.5568, 37.0593) centre (198.5568, 63.04) ccw projected
  circle A1 centre (198.5568, 63.04) radius 25.4
  line L1 (177.7503, 77.6089) -> (213.1256, 83.8465)
  line L2 (213.1256, 83.8465) -> (183.9879, 42.2336)
  line L3 (183.9879, 42.2336) -> (219.3632, 48.4712)
  line L4 (173.5426, 58.6294) -> (223.5709, 67.4507)
  line L5 (282.3739, 19.5971) -> (268.0066, 101.0778) projected
  line L6 (262.1156, 61.3512) -> (265.4236, 42.5907)
  line L7 (196.0756, 19.05) -> (-279.4704, 19.05) projected
  line L8 (268.0066, 101.0778) -> (15.2621, 98.6253) projected
  line L9 (16.5365, 54.1762) -> (165.5437, 54.1762) projected
  circle A2 centre (15.447, 79.5762) radius 7.9502 projected
  point P0 (0, 0)
  point P1 (257.7049, 86.3654)
  point P2 (272.0396, 5.0695)
  point P3 (208.4539, 0)
  point P4 (182.662, 0)
  point P5 (142.447, 77.1409)
  point P6 (91.647, 77.1409)
  dimension "d31" = 25.4
  dimension "d33" = 12.7
  dimension "d34" = 12.7
  dimension "d42" = 50.8
  dimension "d43" = 45
  dimension "d51" = 5.2605
  dimension "d52" = 19.05
  dimension "d53" = 38.1
  dimension "d54" = 19.05
  dimension "d55" = 19.05
  dimension "d56" = 76.2
  dimension "d57" = 101.6
  dimension "d58" = 22.2246
  dimension "d60" = 44.4491
  dimension "d61" = 50.8
  dimension "d62" = 76.2
hole "Hole2" at (-257.7049, 86.3654, 0) at (-262.1156, 61.3512, 0) at (-177.7503, 77.6089, 0) at (-173.5426, 58.6294, 0) at (-183.9879, 42.2336, 0) at (-219.3632, 48.4712, 0) at (-223.5709, 67.4507, 0) at (-213.1256, 83.8465, 0) at (-272.0396, 5.0695, 0) at (-265.4236, 42.5907, 0) at (-208.4539, 0, 0) at (-182.662, 0, 0) at (-142.447, 77.1409, 0) at (-91.647, 77.1409, 0) direction (0, 0, 1) diameter 5.105 end through all clearance for "Flat Head Machine Screw (82)" size "#10" standard "Ansi Unified Screw Threads"
equation "\"d13\" = Thickness"
equation "\"d33\" = d32"
equation "\"d34\" = d32"
equation "\"d58\" = 0.5 * d60"
equation "\"d40\" = Thickness"
equation "\"d5\" = Thickness"
equation "\"d22\" = BendRadius"
equation "\"d23\" = BendReliefWidth"
equation "\"d25\" = MinimumRemnant"
equation "\"d24\" = BendReliefDepth"
equation "\"d26\" = TransitionRadius"
equation "\"BendRadius\" = Thickness"
equation "\"BendReliefWidth\" = Thickness"
equation "\"BendReliefDepth\" = 0.5 * Thickness"
equation "\"CornerReliefSize\" = 4 * Thickness"
equation "\"MinimumRemnant\" = 2 * Thickness"
equation "\"TransitionRadius\" = BendRadius"
equation "\"JacobiRadiusSize\" = BendRadius"
equation "\"GapSize\" = Thickness"
equation "\"Thickness\" = 4.7625"
equation "\"d32\" = 12.7"
properties part number "RACK_GUIDES" material "Polycarbonate, PC 1000, Clear"
